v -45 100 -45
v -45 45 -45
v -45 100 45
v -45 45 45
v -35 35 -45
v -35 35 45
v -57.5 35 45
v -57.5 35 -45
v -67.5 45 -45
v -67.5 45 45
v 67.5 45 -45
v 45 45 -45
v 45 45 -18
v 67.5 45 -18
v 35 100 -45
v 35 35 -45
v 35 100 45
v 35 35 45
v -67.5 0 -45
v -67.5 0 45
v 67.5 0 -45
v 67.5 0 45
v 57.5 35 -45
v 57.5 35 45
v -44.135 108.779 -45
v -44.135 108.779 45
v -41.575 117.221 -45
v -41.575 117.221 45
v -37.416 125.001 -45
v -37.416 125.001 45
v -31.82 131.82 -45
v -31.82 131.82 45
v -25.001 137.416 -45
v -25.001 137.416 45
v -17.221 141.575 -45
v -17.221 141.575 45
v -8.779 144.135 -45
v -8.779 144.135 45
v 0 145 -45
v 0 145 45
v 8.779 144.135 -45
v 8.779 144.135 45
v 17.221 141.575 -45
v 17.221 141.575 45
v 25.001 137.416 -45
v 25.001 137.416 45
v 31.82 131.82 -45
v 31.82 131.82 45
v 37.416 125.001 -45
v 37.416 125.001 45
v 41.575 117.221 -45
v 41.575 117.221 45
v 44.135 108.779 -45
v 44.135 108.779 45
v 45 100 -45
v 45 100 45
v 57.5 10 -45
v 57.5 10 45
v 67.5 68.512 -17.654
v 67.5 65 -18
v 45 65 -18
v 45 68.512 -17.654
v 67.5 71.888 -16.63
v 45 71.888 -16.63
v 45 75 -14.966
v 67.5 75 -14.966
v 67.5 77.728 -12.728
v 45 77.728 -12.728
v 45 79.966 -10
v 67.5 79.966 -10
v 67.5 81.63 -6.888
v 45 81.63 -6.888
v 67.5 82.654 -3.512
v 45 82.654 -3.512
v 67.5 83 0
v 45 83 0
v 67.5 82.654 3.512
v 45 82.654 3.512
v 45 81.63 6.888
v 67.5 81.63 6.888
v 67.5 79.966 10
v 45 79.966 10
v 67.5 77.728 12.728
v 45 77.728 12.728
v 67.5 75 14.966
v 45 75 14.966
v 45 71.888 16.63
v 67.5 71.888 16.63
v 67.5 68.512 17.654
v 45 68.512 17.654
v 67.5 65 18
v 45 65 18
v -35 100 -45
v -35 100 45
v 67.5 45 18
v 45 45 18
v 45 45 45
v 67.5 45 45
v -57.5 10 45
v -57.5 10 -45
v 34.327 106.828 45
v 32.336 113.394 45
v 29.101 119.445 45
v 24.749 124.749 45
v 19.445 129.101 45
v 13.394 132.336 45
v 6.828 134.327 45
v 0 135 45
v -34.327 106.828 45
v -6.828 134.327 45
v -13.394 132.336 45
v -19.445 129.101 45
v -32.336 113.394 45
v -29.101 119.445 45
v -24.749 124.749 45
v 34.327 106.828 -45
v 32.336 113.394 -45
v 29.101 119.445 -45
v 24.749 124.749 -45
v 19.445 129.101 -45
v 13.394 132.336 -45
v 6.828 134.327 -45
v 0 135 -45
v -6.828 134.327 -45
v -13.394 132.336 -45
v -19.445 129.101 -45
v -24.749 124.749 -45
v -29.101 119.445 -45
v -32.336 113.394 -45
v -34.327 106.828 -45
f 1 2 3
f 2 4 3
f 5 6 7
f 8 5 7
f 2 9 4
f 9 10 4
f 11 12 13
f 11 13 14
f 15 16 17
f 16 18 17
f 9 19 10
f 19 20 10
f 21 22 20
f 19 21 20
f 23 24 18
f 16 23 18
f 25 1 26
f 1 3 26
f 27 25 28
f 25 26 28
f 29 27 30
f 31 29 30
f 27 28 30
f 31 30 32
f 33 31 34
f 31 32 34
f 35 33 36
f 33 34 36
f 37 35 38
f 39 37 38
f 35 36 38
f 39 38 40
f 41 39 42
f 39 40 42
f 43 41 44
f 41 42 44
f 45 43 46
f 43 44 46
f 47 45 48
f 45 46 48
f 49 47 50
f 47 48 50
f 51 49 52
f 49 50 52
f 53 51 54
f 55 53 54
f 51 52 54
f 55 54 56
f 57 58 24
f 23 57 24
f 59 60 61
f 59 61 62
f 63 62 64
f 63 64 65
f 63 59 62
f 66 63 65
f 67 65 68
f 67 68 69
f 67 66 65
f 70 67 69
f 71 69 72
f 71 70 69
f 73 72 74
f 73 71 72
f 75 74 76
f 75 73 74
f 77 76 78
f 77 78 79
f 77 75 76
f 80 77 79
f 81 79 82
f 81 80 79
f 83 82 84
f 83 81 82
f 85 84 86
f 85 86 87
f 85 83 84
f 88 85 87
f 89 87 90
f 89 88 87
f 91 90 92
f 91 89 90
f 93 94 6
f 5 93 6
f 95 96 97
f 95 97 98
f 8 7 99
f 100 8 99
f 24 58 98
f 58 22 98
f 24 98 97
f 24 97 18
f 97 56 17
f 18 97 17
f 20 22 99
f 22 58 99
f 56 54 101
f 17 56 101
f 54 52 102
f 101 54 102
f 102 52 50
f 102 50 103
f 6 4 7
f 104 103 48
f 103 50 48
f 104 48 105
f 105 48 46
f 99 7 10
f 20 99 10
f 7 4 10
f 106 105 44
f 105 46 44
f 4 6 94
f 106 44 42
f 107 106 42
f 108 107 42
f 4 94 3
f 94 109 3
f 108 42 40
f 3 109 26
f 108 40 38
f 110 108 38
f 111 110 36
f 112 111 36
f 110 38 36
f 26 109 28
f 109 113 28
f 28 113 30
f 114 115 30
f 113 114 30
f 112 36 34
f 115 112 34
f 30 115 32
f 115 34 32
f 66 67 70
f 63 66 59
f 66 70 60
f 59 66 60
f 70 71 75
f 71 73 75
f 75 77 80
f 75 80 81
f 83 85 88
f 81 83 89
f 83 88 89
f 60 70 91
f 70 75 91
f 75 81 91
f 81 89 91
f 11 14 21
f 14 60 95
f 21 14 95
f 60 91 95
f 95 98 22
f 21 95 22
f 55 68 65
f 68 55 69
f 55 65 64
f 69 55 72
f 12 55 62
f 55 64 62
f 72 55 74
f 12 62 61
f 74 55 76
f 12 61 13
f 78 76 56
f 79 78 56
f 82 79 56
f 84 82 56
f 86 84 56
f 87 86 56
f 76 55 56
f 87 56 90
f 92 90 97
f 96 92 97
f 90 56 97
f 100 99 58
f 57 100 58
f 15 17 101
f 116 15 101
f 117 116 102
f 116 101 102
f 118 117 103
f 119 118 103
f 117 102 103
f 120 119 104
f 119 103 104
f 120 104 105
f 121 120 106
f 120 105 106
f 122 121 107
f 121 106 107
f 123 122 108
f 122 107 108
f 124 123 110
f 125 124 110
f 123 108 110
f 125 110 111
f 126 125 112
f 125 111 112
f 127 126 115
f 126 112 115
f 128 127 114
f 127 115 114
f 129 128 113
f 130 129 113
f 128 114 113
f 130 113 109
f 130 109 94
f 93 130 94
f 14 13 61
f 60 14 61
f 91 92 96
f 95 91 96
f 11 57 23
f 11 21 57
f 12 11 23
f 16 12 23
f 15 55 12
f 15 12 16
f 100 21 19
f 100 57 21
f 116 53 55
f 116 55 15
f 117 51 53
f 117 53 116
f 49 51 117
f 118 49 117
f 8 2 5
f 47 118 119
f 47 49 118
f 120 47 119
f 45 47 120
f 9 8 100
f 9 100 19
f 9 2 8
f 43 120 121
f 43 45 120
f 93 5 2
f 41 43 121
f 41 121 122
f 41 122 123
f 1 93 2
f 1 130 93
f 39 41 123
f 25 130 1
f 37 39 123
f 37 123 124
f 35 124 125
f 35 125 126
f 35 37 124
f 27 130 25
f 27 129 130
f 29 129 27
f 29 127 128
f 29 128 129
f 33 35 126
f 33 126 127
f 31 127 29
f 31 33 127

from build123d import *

# Parameters (mm, degrees)
DODANIE_WYCI_GNI_CIE1_DEPTH = 45
DODANIE_WYCI_GNI_CIE3_DEPTH = 22.5


with BuildPart() as part:
    # Szkic1 → Dodanie-wyciągnięcie1 (new, symmetric)
    with BuildSketch(Plane.XY):
        with BuildLine():
            Line((67.5, 0), (-67.5, 0))
            Line((-67.5, 0), (-67.5, 45))
            Line((-67.5, 45), (-45, 45))
            Line((-45, 45), (-45, 100))
            ThreePointArc((-45, 100), (0, 145), (45, 100))
            Line((45, 100), (45, 45))
            Line((45, 45), (67.5, 45))
            Line((67.5, 45), (67.5, 0))
        make_face()
        with BuildLine():
            Line((35, 35), (35, 100))
            ThreePointArc((35, 100), (0, 135), (-35, 100))
            Line((-35, 100), (-35, 35))
            Line((-35, 35), (-57.5, 35))
            Line((-57.5, 35), (-57.5, 10))
            Line((-57.5, 10), (57.5, 10))
            Line((57.5, 10), (57.5, 35))
            Line((57.5, 35), (35, 35))
        make_face(mode=Mode.SUBTRACT)
    extrude(amount=DODANIE_WYCI_GNI_CIE1_DEPTH, both=True)

    # Szkic2 → Dodanie-wyciągnięcie3 (add)
    with BuildSketch(Plane(origin=(67.5, 0, 0), x_dir=(0, 0, -1), z_dir=(1, 0, 0))):
        with BuildLine():
            Line((-18, 45), (18, 45))
            Line((18, 45), (18, 65))
            ThreePointArc((18, 65), (0, 83), (-18, 65))
            Line((-18, 65), (-18, 45))
        make_face()
    extrude(amount=-DODANIE_WYCI_GNI_CIE3_DEPTH)


solid = part.part
